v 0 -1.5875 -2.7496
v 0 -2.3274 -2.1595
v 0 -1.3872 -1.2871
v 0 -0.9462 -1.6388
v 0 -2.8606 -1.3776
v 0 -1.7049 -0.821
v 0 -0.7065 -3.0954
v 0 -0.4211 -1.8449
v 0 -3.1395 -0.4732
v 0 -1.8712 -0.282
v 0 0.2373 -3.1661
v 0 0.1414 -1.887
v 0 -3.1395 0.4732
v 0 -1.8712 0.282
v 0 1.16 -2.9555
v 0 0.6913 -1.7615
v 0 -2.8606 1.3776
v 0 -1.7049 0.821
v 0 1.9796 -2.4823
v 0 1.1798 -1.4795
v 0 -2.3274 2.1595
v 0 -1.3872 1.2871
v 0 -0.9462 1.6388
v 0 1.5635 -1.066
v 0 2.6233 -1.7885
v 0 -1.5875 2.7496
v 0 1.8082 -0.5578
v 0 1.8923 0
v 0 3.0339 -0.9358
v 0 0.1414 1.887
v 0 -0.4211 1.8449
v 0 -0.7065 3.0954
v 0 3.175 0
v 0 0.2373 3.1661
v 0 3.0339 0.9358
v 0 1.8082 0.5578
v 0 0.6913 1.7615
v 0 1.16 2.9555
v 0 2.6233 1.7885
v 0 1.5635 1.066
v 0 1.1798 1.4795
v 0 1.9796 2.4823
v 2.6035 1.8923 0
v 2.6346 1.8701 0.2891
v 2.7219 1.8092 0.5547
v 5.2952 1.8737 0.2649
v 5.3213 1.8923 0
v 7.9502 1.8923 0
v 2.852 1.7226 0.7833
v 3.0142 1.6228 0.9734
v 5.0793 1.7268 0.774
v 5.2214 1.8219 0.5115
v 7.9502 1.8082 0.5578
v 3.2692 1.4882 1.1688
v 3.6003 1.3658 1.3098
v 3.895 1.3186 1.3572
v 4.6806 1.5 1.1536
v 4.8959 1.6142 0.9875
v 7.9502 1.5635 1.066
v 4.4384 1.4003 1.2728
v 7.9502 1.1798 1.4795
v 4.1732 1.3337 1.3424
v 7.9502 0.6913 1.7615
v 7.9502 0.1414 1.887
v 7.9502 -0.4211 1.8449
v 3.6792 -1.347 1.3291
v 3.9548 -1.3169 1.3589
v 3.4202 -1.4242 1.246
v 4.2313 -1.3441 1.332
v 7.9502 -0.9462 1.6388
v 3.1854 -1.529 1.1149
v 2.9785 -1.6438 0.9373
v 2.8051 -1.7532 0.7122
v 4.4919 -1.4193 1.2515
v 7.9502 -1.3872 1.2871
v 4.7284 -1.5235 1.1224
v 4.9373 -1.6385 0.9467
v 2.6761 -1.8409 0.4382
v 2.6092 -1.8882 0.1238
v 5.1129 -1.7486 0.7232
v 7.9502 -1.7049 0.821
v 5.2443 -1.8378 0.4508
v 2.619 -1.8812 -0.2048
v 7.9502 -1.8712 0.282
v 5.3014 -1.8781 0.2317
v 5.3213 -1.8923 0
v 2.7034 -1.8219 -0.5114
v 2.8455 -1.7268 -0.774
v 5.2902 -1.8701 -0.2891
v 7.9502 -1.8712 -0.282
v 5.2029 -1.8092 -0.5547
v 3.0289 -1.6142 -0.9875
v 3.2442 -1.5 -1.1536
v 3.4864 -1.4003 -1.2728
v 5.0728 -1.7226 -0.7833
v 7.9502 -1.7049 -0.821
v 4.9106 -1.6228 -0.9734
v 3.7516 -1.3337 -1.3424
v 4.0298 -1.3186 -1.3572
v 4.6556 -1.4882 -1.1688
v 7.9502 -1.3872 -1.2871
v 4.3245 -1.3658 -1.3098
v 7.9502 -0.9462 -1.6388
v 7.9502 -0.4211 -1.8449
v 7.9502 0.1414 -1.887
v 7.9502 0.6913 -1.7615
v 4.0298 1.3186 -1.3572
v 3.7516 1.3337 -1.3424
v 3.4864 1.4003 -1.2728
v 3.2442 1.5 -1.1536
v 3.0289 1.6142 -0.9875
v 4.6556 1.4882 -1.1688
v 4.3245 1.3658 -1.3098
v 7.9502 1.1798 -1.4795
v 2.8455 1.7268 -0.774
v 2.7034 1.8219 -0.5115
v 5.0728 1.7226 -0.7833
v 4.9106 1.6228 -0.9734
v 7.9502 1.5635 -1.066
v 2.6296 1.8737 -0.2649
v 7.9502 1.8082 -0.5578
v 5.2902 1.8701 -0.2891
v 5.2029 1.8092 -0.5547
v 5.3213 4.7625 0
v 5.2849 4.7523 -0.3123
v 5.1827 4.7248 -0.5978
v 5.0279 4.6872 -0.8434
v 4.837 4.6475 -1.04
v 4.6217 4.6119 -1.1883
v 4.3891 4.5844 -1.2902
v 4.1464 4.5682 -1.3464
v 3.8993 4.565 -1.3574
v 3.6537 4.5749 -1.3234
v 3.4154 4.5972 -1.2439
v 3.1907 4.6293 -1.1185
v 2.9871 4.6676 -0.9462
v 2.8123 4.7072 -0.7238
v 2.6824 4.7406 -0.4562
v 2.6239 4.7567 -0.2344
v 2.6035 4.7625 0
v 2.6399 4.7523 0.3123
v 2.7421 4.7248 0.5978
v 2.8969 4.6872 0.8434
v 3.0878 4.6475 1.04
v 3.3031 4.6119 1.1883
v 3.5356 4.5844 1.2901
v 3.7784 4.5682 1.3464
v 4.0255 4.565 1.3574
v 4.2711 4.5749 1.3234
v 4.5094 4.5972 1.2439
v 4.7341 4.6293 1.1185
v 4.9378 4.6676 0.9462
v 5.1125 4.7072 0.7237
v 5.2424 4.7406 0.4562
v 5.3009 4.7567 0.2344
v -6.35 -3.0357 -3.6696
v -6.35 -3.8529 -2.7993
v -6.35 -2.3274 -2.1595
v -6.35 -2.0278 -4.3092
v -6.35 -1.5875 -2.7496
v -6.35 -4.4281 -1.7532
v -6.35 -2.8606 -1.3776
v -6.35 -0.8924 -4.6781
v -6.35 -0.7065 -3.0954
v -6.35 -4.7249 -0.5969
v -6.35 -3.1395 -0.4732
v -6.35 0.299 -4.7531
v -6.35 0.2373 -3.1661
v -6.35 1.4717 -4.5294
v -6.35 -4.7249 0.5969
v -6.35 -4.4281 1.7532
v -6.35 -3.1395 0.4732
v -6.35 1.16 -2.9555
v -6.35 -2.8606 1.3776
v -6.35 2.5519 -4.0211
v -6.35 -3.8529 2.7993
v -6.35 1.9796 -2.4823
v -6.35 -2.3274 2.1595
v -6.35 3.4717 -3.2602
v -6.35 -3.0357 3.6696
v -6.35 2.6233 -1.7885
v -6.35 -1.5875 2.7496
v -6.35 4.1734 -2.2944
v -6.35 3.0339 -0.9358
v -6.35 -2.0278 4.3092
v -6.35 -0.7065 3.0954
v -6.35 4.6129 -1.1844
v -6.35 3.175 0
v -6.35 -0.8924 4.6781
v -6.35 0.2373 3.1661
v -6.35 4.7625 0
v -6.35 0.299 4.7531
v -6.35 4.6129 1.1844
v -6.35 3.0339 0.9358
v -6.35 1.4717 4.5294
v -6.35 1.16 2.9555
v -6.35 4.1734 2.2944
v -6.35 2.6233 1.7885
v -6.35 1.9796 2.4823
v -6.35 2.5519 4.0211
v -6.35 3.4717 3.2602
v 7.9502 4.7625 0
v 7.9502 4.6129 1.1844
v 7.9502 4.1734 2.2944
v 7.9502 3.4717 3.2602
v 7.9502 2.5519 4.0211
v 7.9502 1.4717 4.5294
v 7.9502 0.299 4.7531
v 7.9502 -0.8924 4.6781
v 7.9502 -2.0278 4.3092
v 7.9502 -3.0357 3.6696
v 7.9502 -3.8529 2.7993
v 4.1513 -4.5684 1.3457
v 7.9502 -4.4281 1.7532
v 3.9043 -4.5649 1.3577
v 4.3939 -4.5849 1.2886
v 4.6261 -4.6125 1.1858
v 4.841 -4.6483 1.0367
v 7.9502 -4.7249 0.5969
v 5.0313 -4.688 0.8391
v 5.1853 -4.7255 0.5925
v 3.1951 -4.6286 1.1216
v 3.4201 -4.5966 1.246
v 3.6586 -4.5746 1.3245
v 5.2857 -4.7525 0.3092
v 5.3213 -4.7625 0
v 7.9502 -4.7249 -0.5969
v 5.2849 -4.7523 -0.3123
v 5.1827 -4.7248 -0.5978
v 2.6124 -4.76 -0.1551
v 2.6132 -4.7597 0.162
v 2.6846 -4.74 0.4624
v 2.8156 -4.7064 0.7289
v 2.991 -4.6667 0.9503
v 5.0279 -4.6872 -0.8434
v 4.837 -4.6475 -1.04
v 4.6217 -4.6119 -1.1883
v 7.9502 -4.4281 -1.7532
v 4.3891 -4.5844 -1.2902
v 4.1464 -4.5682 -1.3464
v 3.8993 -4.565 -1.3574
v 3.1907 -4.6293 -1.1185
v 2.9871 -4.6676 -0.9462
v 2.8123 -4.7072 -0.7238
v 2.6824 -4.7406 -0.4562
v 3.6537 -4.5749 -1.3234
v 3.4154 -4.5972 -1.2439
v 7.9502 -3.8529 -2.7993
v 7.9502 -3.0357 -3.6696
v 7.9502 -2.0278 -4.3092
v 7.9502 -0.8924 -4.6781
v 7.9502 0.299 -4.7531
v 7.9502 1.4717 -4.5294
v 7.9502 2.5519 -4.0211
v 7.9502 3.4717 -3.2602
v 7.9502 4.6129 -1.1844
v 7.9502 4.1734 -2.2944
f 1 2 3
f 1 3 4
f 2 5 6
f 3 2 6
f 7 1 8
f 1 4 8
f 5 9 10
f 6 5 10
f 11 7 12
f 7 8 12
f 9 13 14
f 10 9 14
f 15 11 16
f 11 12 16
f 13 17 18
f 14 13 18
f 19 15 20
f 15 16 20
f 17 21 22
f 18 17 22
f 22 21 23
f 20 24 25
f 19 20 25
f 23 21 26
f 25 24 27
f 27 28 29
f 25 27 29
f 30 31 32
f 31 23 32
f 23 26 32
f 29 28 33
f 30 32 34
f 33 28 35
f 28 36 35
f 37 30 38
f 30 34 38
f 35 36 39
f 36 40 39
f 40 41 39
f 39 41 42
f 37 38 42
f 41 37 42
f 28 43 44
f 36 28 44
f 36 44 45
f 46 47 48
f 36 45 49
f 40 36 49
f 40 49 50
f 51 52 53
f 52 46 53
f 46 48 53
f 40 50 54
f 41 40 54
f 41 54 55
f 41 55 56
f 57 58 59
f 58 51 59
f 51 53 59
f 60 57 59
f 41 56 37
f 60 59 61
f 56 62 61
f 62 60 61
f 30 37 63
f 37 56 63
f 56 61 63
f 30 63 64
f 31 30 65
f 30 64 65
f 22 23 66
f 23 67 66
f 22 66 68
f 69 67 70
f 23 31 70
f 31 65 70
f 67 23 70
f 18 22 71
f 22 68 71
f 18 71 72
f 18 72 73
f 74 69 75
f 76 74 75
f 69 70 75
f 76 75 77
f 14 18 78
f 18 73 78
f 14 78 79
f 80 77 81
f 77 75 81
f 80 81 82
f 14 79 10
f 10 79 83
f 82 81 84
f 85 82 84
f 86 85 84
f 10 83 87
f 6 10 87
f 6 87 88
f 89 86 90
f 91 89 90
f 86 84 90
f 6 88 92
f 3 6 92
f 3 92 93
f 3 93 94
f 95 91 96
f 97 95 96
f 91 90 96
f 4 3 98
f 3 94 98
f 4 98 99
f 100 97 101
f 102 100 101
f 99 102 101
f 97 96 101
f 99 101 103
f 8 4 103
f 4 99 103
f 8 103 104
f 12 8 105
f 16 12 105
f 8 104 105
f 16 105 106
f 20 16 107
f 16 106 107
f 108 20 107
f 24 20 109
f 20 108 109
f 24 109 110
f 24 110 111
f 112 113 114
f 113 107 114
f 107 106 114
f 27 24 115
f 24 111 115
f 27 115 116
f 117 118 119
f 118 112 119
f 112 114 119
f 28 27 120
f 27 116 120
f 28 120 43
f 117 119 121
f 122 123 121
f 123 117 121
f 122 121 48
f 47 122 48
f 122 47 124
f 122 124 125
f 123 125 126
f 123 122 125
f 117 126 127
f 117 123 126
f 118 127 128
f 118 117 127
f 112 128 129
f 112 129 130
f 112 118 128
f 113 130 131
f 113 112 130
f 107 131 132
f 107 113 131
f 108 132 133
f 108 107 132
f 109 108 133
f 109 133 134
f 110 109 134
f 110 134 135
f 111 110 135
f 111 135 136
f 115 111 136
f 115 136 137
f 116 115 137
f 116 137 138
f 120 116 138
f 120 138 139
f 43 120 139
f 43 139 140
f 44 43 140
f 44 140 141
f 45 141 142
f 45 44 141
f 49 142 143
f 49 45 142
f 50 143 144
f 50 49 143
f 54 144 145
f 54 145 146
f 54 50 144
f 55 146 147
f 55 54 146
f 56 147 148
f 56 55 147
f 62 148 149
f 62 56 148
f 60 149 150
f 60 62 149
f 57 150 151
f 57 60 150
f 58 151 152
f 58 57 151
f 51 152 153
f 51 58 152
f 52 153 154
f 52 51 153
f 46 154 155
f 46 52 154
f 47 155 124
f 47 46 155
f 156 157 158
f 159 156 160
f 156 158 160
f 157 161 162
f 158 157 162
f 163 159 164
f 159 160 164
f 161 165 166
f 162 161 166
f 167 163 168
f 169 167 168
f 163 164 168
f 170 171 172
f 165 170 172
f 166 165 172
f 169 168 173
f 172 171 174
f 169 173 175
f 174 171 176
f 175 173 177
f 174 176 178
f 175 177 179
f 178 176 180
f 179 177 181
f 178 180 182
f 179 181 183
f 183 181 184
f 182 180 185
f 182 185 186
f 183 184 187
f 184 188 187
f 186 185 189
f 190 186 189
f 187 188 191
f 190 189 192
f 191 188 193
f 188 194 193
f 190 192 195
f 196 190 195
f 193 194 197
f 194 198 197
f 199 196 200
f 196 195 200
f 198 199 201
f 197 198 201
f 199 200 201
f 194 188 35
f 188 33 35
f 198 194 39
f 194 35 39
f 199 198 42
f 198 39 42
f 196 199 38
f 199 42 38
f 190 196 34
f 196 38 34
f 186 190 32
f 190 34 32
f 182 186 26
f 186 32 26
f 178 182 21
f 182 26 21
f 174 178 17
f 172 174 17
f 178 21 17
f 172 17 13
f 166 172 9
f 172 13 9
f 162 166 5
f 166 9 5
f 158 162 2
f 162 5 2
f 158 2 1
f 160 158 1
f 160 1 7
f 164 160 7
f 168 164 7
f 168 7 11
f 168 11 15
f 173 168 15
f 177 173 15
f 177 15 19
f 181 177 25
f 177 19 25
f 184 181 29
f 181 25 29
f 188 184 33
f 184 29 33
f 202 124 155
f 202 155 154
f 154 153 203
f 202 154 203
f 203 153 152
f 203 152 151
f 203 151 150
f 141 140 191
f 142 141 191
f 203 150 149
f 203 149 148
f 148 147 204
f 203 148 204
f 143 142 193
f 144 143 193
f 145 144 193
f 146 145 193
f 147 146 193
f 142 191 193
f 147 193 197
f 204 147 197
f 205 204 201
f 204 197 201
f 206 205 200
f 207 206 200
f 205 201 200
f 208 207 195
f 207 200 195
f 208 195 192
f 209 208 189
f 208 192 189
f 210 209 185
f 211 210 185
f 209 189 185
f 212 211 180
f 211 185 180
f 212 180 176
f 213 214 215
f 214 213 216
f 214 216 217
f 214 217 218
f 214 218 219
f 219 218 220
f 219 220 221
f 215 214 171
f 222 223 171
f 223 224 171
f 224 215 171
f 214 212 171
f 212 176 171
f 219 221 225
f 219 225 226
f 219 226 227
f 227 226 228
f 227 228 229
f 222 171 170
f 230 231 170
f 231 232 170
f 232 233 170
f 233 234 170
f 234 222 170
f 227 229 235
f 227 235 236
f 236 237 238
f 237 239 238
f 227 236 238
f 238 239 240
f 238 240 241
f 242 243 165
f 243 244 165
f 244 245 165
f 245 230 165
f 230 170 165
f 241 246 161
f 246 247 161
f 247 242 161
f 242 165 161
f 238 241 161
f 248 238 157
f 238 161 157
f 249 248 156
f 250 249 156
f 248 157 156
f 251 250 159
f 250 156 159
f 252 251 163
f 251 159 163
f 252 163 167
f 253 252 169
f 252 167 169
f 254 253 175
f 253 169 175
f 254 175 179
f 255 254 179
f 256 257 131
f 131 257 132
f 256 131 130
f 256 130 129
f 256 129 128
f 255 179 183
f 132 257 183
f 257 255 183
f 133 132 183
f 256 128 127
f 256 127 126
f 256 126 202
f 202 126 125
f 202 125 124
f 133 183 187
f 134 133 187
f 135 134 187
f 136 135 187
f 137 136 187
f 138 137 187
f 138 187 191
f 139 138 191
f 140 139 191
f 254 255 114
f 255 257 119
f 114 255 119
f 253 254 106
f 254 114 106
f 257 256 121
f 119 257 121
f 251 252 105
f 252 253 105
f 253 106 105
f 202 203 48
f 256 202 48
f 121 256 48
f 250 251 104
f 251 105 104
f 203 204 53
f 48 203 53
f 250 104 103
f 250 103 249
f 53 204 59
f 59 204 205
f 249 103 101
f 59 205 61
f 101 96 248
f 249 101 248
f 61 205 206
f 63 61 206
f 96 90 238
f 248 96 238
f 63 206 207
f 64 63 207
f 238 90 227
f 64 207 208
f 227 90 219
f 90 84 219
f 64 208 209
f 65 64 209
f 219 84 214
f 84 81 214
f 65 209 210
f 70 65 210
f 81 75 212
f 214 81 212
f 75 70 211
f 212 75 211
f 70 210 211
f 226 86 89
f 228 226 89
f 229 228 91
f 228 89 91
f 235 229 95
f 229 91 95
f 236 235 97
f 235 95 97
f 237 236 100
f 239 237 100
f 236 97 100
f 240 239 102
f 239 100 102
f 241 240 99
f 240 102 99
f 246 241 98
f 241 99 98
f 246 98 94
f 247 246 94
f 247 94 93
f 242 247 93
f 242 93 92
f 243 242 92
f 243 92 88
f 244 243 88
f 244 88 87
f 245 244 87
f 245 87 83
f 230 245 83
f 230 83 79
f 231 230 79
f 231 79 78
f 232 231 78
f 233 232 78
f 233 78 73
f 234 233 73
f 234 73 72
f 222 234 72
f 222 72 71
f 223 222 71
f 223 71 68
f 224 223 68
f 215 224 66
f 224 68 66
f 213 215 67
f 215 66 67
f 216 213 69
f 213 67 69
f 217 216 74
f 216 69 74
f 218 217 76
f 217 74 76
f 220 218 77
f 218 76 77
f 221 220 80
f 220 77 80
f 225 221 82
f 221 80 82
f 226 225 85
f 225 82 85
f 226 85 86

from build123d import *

# Parameters (mm, degrees)
SKETCH4_R               = 1.3589
CUT_EXTRUDE1_DEPTH      = 5.7625
CUT_EXTRUDE1_DEPTH_BACK = 5.7625


with BuildPart() as part:
    # Sketch3 → Revolve1 (revolve)
    with BuildSketch(Plane.XY):
        Polygon((-6.35, 4.7625), (-6.35, 3.175), (0, 3.175), (0, 1.8923), (7.9502, 1.8923), (7.9502, 4.7625), align=None)
    revolve(axis=Axis((0, 0, 0), (1, 0, 0)))

    # Sketch4 → Cut-Extrude1 (cut, two sides)
    with BuildSketch(Plane(origin=(0, 0, 0), x_dir=(1, 0, 0), z_dir=(0, 1, 0))) as cut_extrude1_sk:
        with Locations((3.9624, 0)):
            Circle(SKETCH4_R)
    extrude(amount=CUT_EXTRUDE1_DEPTH, mode=Mode.SUBTRACT)
    extrude(cut_extrude1_sk.sketch, amount=-CUT_EXTRUDE1_DEPTH_BACK, mode=Mode.SUBTRACT)


solid = part.part
